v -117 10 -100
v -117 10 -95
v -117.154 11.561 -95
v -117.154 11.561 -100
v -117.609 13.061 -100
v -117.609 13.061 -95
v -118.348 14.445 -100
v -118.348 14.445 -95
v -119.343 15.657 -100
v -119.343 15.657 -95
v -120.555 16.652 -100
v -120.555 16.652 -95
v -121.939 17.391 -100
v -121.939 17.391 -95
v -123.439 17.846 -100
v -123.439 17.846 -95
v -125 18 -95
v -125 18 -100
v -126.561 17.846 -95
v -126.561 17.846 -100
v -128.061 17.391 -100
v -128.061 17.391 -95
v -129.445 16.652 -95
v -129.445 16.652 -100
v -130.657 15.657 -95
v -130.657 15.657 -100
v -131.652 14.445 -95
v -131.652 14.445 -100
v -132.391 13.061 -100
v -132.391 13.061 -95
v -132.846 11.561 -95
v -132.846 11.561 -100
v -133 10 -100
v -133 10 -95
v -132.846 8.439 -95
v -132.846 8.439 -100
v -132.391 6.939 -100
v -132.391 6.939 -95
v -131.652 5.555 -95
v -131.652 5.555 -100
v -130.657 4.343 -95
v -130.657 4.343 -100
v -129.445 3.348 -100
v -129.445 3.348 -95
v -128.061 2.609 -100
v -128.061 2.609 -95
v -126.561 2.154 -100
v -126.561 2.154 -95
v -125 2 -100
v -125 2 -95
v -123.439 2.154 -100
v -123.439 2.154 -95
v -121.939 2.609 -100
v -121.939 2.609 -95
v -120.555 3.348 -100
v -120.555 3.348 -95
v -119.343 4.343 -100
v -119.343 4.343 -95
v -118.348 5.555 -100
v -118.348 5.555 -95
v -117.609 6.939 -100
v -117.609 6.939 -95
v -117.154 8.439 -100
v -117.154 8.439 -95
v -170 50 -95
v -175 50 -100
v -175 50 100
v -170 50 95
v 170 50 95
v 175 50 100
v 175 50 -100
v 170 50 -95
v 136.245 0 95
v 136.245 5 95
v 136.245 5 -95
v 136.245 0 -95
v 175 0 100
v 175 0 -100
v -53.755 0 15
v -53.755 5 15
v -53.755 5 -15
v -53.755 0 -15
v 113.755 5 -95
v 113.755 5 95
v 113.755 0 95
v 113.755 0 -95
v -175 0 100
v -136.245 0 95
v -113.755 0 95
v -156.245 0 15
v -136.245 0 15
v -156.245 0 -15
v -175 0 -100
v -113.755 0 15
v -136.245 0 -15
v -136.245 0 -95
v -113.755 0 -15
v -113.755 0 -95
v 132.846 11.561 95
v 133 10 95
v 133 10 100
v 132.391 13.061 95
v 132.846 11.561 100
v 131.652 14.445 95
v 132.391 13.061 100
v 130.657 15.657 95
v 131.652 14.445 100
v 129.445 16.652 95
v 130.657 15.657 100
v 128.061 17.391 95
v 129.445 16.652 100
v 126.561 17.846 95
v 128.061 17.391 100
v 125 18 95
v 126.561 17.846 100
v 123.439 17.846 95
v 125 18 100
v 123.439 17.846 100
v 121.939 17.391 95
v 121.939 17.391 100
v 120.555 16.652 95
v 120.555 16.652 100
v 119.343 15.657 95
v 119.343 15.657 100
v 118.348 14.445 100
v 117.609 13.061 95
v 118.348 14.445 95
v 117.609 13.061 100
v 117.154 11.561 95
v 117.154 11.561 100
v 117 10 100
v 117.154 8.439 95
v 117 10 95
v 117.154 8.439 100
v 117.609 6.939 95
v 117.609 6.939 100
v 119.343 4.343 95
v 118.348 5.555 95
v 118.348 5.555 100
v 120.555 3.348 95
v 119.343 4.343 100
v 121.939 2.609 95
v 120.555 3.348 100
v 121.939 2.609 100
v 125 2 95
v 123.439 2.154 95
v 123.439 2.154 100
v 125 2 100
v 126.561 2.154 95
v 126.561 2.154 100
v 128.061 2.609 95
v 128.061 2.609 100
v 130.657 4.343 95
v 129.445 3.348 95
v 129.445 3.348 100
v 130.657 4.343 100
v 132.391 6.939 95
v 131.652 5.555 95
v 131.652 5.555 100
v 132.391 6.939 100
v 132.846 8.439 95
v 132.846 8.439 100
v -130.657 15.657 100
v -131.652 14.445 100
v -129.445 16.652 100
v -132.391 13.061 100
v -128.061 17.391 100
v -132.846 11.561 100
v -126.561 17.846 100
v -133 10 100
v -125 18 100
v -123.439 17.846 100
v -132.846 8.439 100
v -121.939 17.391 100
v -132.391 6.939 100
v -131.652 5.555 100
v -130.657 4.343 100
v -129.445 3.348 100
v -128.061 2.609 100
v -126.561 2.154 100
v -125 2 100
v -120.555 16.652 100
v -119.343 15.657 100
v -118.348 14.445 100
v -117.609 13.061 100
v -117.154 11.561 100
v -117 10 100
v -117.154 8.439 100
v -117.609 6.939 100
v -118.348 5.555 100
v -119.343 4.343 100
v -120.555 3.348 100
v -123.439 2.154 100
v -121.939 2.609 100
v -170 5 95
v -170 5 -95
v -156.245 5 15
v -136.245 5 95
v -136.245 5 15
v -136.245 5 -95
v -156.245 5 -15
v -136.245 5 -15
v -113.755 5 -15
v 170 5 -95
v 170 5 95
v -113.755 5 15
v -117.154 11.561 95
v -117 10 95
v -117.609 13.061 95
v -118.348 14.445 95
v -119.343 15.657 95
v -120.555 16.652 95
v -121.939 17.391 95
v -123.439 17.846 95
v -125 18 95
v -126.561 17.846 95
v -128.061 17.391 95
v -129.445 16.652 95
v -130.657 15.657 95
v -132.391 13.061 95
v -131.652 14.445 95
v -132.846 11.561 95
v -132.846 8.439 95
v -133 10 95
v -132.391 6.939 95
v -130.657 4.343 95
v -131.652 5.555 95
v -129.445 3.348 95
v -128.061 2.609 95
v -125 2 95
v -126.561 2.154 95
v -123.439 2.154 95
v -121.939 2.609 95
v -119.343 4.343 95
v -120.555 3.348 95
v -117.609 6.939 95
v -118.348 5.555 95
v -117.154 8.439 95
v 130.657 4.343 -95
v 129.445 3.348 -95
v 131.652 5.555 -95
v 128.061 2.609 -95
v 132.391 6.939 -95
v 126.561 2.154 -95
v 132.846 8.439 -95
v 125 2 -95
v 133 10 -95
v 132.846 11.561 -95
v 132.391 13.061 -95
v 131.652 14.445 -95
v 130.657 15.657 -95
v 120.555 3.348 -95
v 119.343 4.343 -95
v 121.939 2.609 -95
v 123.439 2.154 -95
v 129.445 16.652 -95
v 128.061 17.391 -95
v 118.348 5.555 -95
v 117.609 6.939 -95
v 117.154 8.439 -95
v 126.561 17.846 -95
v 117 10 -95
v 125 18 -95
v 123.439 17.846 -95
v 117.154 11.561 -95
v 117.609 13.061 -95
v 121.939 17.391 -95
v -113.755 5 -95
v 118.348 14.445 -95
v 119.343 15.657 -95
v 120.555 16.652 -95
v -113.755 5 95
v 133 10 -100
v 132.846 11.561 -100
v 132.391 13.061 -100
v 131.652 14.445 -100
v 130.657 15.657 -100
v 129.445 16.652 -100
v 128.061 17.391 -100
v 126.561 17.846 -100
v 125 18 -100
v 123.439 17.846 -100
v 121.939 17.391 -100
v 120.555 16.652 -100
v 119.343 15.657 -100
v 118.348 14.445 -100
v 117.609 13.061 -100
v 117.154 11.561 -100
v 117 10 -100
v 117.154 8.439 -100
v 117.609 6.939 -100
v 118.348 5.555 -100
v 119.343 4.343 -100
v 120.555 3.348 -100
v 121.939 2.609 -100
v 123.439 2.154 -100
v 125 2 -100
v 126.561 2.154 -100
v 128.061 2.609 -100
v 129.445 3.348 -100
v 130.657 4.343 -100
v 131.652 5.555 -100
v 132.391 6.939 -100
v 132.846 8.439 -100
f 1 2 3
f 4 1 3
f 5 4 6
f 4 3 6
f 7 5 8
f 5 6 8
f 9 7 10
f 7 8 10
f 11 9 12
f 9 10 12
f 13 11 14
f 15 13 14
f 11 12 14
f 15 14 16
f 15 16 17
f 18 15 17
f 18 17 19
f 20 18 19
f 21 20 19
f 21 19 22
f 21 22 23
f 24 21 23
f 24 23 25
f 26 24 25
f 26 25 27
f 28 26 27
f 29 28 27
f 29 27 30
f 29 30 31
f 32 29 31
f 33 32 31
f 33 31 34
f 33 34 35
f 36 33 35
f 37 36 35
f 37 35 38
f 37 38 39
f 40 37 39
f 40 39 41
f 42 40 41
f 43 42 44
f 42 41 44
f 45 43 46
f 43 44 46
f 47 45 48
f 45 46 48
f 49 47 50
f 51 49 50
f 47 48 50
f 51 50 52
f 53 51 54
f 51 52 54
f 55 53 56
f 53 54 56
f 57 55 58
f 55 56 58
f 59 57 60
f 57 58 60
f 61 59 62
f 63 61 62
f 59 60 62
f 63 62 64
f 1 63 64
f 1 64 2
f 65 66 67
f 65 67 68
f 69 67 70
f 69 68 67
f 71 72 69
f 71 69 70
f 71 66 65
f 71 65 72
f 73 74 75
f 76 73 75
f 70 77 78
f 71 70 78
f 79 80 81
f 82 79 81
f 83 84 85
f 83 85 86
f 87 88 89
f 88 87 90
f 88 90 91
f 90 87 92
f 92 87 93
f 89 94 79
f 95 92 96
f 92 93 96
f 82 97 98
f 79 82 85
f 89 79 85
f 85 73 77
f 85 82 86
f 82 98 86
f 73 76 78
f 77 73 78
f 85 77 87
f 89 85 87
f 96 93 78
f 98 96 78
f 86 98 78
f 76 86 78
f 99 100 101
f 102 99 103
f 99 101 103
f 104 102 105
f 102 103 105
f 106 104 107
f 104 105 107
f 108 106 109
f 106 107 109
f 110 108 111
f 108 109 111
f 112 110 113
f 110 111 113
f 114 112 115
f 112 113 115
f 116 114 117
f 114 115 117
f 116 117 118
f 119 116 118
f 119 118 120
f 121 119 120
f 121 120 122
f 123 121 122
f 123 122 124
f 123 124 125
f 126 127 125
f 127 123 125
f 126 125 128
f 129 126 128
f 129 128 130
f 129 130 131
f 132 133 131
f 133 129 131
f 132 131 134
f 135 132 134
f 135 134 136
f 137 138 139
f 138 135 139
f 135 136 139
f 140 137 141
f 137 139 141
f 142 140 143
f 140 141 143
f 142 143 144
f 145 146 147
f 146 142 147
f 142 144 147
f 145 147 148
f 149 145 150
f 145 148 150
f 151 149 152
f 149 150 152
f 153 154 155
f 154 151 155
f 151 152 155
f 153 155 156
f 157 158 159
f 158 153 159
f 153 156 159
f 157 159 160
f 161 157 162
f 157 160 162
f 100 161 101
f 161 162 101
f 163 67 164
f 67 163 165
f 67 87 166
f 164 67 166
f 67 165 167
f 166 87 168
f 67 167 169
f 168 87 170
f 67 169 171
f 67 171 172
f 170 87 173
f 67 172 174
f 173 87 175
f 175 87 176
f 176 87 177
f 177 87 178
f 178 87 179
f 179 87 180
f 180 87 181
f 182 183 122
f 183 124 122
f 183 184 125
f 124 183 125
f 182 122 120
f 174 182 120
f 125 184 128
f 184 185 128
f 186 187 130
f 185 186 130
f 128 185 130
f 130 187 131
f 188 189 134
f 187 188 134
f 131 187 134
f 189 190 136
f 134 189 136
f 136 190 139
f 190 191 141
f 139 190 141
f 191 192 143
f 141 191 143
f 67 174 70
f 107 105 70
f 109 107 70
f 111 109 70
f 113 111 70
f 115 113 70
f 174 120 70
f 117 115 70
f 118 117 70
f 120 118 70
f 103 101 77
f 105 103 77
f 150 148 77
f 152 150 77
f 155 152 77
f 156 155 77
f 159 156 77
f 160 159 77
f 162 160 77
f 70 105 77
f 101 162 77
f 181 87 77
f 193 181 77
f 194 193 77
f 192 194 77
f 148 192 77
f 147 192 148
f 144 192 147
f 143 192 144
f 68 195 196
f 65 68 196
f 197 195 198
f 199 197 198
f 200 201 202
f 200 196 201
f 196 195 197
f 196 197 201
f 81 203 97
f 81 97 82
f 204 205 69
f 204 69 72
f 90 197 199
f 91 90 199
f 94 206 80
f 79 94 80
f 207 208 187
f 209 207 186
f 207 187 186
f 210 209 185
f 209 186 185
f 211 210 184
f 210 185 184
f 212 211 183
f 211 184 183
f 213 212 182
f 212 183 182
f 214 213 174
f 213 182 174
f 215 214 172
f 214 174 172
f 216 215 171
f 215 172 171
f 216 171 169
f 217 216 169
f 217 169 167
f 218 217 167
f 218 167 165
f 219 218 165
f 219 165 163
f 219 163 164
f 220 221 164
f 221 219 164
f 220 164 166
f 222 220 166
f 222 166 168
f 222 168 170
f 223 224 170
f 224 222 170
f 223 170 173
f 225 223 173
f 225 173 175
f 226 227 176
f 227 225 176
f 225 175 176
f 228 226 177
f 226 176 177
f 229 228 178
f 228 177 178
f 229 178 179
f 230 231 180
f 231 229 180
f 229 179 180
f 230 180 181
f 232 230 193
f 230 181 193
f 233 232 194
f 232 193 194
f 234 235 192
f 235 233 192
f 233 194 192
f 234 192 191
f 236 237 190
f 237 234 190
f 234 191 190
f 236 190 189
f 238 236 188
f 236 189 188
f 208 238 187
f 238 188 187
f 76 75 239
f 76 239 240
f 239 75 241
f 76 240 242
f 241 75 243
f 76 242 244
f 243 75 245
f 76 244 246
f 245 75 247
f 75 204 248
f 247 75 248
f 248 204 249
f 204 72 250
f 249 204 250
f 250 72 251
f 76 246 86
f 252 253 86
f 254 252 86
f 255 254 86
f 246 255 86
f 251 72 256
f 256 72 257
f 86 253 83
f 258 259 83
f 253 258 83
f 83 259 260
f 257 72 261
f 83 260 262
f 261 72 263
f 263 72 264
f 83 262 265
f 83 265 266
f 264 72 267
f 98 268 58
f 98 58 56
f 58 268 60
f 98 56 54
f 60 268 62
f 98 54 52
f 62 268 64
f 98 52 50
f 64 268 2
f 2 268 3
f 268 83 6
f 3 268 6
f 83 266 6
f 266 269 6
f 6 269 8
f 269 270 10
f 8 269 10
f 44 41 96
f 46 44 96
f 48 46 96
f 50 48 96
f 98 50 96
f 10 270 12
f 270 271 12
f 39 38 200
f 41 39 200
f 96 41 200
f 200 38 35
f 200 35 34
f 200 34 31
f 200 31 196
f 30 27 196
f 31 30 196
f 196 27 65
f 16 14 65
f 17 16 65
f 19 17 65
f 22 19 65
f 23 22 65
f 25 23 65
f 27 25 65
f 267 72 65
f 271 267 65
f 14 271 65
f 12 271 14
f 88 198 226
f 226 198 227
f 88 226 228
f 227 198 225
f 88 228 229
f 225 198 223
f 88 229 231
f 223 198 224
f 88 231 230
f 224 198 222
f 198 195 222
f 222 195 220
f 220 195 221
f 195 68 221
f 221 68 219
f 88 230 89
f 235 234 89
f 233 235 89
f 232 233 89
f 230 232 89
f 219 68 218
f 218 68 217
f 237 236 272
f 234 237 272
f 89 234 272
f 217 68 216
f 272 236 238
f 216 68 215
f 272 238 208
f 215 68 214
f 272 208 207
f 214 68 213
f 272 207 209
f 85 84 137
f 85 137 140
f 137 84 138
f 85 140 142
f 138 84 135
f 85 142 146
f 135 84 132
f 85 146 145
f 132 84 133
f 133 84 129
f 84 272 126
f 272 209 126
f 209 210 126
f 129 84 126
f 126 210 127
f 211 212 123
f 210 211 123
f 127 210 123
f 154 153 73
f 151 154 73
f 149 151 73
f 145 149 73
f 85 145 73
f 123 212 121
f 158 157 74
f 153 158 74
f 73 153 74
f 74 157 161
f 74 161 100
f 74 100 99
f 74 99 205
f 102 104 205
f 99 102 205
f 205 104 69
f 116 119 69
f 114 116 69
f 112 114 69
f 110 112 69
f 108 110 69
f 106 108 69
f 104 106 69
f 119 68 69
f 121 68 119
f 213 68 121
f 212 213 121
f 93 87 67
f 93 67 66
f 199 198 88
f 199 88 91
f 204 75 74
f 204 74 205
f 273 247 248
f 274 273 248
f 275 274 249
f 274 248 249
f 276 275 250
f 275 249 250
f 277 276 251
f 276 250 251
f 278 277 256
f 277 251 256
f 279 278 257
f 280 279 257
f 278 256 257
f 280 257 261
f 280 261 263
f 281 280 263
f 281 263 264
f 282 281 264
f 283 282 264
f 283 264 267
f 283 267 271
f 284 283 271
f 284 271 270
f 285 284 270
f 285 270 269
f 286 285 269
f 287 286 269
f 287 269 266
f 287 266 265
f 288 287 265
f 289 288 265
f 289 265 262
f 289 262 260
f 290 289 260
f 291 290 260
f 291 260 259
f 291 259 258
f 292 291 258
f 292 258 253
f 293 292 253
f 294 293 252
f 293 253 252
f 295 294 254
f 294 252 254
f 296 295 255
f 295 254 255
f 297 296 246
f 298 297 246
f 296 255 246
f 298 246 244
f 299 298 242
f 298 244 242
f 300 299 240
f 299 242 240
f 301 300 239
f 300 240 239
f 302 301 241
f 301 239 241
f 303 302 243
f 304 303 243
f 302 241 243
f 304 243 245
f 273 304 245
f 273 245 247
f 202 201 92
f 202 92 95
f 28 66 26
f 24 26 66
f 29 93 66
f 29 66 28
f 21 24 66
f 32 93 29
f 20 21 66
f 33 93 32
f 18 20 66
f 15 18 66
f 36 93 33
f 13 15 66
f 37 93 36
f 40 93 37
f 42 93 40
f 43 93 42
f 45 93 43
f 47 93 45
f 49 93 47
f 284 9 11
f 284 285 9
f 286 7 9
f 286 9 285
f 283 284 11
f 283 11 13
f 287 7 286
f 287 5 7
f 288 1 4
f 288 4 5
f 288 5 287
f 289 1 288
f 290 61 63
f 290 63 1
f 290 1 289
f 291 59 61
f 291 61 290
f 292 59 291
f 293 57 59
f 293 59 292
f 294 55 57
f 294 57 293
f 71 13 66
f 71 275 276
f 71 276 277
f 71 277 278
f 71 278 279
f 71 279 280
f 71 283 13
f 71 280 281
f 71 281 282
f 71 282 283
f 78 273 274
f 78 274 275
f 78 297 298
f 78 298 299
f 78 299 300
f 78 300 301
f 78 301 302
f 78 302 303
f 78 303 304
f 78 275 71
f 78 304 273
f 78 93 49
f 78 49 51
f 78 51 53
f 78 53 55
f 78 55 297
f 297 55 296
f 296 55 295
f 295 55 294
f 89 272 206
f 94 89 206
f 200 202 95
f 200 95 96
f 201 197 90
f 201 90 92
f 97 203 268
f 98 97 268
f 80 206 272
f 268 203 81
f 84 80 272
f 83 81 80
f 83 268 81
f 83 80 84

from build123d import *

# Parameters (mm, degrees)
SKETCH1_W           = 350
SKETCH1_H           = 200
BOSS_EXTRUDE1_DEPTH = 50
SHELL1_T            = -5
CUT_EXTRUDE1_REACH  = 272.416
SKETCH3_R           = 8
SKETCH4_W           = 17.489995996
SKETCH4_H           = 190
SKETCH4_W_2         = 5
CUT_EXTRUDE4_DEPTH  = 10
SKETCH5_W           = 102.489995996
SKETCH5_H           = 30
CUT_EXTRUDE5_DEPTH  = 10


with BuildPart() as part:
    # Sketch1 → Boss-Extrude1 (new body)
    with BuildSketch(Plane(origin=(0, 0, 0), x_dir=(1, 0, 0), z_dir=(0, 1, 0))):
        Rectangle(SKETCH1_W, SKETCH1_H)
    extrude(amount=BOSS_EXTRUDE1_DEPTH)

    # Shell1
    shell1_openings = [part.faces().sort_by_distance(p)[0] for p in [
        (0, 50, 0),
    ]]
    offset(amount=SHELL1_T, openings=shell1_openings, kind=Kind.INTERSECTION)

    # Cut-Extrude1: up to this face of the body (flat: up to its plane)
    cut_extrude1_end = Plane(part.part.faces().sort_by_distance((0, 25, -100))[0])
    # Sketch3 → Cut-Extrude1 (cut, up to the picked face)
    with BuildSketch(Plane.XY.offset(100), mode=Mode.PRIVATE) as cut_extrude1_sk1:
        with Locations((-125, 10)):
            Circle(SKETCH3_R)
    cut_extrude1_tool1 = split(extrude(cut_extrude1_sk1.sketch, amount=-CUT_EXTRUDE1_REACH, mode=Mode.PRIVATE), bisect_by=cut_extrude1_end, keep=Keep.BOTH, mode=Mode.PRIVATE)
    # Sketch3 → Cut-Extrude1 (cut, up to the picked face)
    with BuildSketch(Plane.XY.offset(100), mode=Mode.PRIVATE) as cut_extrude1_sk2:
        with Locations((125, 10)):
            Circle(SKETCH3_R)
    cut_extrude1_tool2 = split(extrude(cut_extrude1_sk2.sketch, amount=-CUT_EXTRUDE1_REACH, mode=Mode.PRIVATE), bisect_by=cut_extrude1_end, keep=Keep.BOTH, mode=Mode.PRIVATE)
    add(cut_extrude1_tool1.solids().sort_by(Axis((-125, 10, 100), (0, 0, -1)))[0], mode=Mode.SUBTRACT)
    add(cut_extrude1_tool2.solids().sort_by(Axis((125, 10, 100), (0, 0, -1)))[0], mode=Mode.SUBTRACT)

    # Sketch4 → Cut-Extrude4 (cut)
    with BuildSketch(Plane(origin=(0, 5, 0), x_dir=(1, 0, 0), z_dir=(0, 1, 0))):
        with Locations((-127.5, 0)):
            Rectangle(SKETCH4_W, SKETCH4_H)
        with Locations((-116.255002002, 0)):
            Rectangle(SKETCH4_W_2, SKETCH4_H)
        with Locations((116.255002002, 0)):
            Rectangle(SKETCH4_W_2, SKETCH4_H)
        with Locations((127.5, 0)):
            Rectangle(SKETCH4_W, SKETCH4_H)
    extrude(amount=-CUT_EXTRUDE4_DEPTH, mode=Mode.SUBTRACT)

    # Sketch5 → Cut-Extrude5 (cut)
    with BuildSketch(Plane(origin=(0, 5, 0), x_dir=(1, 0, 0), z_dir=(0, 1, 0))):
        with Locations((-105, 0)):
            Rectangle(SKETCH5_W, SKETCH5_H)
    extrude(amount=-CUT_EXTRUDE5_DEPTH, mode=Mode.SUBTRACT)


solid = part.part
